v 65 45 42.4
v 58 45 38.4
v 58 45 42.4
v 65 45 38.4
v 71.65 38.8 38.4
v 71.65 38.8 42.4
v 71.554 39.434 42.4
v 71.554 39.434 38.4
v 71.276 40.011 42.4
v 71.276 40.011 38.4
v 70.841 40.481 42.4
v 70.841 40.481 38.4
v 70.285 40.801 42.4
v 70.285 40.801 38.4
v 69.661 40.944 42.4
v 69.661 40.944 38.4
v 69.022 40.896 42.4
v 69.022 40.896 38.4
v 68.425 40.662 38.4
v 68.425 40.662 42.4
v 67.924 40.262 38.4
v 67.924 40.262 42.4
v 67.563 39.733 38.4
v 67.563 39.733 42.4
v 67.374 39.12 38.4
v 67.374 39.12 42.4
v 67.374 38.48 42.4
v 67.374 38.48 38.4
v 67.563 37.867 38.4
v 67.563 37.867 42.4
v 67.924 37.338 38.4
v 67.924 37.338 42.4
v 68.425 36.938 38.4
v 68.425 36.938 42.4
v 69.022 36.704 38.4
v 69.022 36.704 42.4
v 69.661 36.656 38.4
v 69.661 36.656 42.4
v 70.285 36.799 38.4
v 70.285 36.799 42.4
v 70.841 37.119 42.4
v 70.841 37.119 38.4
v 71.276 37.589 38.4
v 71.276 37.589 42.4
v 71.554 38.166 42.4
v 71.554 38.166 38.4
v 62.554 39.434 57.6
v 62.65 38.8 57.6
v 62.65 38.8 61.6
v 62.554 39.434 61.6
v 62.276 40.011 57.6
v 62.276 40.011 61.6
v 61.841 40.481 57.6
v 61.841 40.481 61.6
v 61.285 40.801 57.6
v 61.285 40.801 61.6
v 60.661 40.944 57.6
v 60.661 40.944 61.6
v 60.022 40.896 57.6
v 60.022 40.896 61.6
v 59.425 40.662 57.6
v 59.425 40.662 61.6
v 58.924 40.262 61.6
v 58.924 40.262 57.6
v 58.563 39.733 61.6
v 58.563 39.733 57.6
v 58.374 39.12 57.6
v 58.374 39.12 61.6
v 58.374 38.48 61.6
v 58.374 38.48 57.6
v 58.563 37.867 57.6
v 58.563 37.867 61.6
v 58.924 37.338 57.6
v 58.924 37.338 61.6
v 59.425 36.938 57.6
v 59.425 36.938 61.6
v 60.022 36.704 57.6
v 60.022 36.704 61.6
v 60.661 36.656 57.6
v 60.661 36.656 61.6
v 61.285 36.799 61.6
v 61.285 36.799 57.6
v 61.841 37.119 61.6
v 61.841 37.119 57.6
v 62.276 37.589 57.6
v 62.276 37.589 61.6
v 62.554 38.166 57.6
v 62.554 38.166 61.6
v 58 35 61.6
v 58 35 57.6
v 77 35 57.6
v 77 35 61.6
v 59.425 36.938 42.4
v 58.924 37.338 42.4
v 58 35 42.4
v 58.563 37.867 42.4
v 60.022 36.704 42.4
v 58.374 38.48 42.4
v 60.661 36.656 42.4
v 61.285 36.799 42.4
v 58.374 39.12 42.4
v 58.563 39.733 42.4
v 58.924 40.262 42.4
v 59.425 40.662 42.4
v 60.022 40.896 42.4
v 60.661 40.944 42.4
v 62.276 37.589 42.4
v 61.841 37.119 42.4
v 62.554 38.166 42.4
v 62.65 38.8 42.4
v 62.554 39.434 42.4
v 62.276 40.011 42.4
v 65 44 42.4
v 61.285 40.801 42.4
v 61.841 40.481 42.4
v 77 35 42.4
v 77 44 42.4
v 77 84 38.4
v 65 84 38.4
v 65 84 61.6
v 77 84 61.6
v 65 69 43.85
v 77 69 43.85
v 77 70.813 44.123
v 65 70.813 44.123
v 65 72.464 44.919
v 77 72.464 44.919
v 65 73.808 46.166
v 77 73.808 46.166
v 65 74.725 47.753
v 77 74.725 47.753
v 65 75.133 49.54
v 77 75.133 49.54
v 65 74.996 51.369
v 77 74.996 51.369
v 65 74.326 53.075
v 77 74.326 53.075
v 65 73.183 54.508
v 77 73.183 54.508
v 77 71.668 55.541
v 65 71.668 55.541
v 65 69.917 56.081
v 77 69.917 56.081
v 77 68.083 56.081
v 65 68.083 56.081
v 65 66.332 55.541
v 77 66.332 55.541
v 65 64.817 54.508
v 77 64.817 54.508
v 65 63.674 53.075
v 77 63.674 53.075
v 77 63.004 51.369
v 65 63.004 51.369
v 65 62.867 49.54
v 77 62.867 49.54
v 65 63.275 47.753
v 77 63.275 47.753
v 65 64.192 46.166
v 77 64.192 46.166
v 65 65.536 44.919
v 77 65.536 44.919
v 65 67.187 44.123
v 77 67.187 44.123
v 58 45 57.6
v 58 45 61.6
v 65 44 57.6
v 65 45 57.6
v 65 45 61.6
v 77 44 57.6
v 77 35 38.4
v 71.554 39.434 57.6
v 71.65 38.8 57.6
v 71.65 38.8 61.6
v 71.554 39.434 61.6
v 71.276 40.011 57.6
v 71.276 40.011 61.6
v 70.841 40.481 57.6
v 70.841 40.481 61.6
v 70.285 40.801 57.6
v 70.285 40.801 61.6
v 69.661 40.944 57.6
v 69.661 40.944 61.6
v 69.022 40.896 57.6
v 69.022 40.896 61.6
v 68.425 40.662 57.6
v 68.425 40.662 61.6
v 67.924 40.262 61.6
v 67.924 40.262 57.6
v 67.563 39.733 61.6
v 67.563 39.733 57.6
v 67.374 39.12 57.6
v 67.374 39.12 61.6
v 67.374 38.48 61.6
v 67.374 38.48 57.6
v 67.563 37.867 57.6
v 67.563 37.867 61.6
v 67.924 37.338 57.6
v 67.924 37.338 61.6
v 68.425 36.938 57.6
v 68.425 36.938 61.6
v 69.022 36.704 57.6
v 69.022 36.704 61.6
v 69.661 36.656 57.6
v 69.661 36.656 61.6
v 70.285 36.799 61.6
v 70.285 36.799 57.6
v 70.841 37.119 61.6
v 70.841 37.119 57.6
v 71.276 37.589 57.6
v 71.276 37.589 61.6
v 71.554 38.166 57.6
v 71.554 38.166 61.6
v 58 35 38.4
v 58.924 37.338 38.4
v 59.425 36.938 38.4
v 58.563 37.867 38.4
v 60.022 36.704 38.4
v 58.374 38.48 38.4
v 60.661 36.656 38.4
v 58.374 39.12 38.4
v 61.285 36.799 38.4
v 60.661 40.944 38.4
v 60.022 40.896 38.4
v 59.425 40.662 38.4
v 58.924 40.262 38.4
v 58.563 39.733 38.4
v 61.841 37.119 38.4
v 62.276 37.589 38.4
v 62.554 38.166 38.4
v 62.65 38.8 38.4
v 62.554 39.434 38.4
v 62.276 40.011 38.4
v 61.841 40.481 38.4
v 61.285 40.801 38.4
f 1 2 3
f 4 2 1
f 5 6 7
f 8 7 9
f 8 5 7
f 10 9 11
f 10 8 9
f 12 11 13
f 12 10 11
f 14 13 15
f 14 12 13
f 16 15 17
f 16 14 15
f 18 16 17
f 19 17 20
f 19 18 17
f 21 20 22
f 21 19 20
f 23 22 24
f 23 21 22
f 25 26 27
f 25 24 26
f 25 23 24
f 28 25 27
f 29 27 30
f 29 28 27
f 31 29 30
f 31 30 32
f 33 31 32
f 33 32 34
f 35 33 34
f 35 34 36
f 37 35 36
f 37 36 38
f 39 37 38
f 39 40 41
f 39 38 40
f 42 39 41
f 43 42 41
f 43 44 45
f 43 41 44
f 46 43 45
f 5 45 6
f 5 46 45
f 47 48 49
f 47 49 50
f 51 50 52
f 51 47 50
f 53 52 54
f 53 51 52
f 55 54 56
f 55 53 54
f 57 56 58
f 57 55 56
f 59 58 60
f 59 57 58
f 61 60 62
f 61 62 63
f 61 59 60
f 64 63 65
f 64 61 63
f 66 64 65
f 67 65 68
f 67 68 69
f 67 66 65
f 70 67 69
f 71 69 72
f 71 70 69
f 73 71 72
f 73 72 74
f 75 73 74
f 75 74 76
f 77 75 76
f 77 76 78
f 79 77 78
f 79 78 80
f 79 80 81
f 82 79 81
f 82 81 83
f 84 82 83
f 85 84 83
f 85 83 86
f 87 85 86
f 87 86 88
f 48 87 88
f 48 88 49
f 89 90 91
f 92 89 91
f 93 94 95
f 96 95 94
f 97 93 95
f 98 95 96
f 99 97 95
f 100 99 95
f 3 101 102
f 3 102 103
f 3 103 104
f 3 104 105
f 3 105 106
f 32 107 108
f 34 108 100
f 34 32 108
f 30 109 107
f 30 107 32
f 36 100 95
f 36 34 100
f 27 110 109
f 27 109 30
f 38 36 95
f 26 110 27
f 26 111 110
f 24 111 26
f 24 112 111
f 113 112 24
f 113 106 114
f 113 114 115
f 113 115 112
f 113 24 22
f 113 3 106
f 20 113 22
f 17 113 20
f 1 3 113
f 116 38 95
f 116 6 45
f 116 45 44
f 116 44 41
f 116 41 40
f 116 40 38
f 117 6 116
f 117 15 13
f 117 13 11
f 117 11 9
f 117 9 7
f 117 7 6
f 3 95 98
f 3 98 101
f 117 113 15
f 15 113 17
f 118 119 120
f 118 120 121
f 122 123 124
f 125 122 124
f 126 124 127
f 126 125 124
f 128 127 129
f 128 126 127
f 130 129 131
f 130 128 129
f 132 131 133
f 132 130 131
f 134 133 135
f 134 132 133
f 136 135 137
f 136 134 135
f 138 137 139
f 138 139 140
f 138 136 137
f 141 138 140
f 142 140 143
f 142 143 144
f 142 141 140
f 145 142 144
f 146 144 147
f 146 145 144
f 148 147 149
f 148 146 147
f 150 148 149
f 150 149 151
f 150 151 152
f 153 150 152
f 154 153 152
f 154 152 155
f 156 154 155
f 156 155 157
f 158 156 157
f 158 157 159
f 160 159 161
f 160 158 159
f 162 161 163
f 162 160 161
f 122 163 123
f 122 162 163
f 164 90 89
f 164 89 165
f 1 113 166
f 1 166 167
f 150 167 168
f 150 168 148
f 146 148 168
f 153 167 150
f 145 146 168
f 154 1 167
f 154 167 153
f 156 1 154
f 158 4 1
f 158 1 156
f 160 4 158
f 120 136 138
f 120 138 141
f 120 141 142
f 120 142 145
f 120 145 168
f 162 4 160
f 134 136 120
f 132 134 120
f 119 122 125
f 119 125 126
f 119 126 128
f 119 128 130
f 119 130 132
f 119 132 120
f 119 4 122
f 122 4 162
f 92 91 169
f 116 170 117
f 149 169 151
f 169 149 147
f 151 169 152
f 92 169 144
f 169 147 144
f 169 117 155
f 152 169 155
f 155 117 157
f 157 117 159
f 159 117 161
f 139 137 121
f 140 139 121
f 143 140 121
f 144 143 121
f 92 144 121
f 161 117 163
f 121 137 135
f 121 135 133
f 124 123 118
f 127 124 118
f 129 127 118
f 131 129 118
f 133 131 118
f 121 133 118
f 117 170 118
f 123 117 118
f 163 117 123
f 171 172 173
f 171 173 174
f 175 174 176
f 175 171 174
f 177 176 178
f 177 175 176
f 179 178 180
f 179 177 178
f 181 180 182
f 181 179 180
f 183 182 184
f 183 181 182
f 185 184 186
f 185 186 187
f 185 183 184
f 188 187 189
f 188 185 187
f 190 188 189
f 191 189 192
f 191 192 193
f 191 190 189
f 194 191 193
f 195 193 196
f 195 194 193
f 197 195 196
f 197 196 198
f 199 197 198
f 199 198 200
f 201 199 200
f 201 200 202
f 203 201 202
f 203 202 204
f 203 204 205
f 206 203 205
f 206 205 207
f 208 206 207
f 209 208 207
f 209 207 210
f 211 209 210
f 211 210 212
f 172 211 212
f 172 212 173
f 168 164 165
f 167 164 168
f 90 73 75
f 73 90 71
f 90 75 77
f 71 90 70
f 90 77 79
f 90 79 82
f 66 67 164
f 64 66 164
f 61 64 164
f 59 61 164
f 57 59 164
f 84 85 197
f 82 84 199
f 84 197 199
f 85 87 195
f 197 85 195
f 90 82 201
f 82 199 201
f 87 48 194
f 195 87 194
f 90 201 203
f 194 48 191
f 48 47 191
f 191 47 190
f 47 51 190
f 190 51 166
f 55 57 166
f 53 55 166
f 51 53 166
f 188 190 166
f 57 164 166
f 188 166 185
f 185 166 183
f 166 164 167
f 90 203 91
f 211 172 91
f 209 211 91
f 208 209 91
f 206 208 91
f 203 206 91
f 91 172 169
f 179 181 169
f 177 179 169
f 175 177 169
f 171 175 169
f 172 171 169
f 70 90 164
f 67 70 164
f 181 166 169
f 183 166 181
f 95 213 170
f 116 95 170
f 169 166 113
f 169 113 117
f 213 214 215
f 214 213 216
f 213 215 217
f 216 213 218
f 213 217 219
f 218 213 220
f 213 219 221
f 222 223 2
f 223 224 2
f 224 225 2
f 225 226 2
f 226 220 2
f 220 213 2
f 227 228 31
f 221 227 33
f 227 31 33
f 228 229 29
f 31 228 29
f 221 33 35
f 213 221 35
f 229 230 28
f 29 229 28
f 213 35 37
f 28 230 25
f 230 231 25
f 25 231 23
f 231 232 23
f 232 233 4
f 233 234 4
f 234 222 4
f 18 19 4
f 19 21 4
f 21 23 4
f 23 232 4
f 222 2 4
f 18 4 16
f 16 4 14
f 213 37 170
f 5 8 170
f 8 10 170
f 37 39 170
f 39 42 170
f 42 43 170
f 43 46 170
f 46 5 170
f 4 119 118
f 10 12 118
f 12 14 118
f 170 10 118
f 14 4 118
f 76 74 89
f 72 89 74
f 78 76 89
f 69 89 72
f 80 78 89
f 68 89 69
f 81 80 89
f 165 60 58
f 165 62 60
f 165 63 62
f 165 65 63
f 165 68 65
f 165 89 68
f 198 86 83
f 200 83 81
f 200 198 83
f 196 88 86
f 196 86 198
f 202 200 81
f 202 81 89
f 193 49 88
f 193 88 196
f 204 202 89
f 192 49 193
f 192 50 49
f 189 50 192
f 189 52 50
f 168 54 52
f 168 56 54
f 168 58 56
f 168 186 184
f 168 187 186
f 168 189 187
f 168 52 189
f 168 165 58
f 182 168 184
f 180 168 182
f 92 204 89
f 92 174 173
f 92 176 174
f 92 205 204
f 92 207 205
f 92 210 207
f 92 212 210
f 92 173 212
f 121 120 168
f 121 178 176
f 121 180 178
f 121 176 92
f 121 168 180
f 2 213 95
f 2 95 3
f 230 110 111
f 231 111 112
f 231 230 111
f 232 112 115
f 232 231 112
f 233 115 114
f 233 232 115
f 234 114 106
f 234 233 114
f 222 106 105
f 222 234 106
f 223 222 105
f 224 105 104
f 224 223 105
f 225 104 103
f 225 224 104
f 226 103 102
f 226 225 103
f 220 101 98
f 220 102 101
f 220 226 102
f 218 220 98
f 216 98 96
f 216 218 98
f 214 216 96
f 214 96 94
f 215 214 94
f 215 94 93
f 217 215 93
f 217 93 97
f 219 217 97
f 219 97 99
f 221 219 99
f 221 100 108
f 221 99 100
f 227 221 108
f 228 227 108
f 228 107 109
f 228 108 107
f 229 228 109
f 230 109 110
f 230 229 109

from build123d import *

# Parameters (mm, degrees)
GUIDED_START                               = 38.4
SKETCH1_W                                  = 12
SKETCH1_H                                  = 40
GUIDED_BRIDGE_WITH_ROD_COUPLING_SEAT_DEPTH = 23.2
LOWER_START                                = 38.4
SKETCH2_W                                  = 19
SKETCH2_H                                  = 10
LOWER_LAP_EAR_CLEARS_STOP_STATION_DEPTH    = 4
UPPER_START                                = 57.6
SKETCH3_W                                  = 19
SKETCH3_H                                  = 10
UPPER_LAP_EAR_CLEARS_STOP_STATION_DEPTH    = 4
M4_START                                   = 38.4
SKETCH4_R                                  = 2.15
M4_JOINT_BOLT_CLEARANCE_DEPTH              = 23.2
RADIAL_START                               = 65
SKETCH5_R                                  = 6.15
RADIAL_FLOATING_STUD_CLEARANCE_DEPTH       = 12


with BuildPart() as part:
    # Sketch1 → Guided bridge with rod coupling seat (new body)
    with BuildSketch(Plane.XY.offset(GUIDED_START)):
        with Locations((71, 64)):
            Rectangle(SKETCH1_W, SKETCH1_H)
    extrude(amount=GUIDED_BRIDGE_WITH_ROD_COUPLING_SEAT_DEPTH)

    # Sketch2 → Lower lap ear clears stop station (add)
    with BuildSketch(Plane.XY.offset(LOWER_START)):
        with Locations((67.5, 40)):
            Rectangle(SKETCH2_W, SKETCH2_H)
    extrude(amount=LOWER_LAP_EAR_CLEARS_STOP_STATION_DEPTH)

    # Sketch3 → Upper lap ear clears stop station (add)
    with BuildSketch(Plane.XY.offset(UPPER_START)):
        with Locations((67.5, 40)):
            Rectangle(SKETCH3_W, SKETCH3_H)
    extrude(amount=UPPER_LAP_EAR_CLEARS_STOP_STATION_DEPTH)

    # Sketch4 → M4 joint bolt clearance (cut)
    with BuildSketch(Plane.XY.offset(M4_START)):
        with Locations((60.5, 38.8)):
            Circle(SKETCH4_R)
        with Locations((69.5, 38.8)):
            Circle(SKETCH4_R)
    extrude(amount=M4_JOINT_BOLT_CLEARANCE_DEPTH, mode=Mode.SUBTRACT)

    # Sketch5 → Radial floating stud clearance (cut)
    with BuildSketch(Plane(origin=(0, 0, 0), x_dir=(0, 0, -1), z_dir=(1, 0, 0)).offset(RADIAL_START)):
        with Locations((-50, 69)):
            Circle(SKETCH5_R)
    extrude(amount=RADIAL_FLOATING_STUD_CLEARANCE_DEPTH, mode=Mode.SUBTRACT)


solid = part.part
